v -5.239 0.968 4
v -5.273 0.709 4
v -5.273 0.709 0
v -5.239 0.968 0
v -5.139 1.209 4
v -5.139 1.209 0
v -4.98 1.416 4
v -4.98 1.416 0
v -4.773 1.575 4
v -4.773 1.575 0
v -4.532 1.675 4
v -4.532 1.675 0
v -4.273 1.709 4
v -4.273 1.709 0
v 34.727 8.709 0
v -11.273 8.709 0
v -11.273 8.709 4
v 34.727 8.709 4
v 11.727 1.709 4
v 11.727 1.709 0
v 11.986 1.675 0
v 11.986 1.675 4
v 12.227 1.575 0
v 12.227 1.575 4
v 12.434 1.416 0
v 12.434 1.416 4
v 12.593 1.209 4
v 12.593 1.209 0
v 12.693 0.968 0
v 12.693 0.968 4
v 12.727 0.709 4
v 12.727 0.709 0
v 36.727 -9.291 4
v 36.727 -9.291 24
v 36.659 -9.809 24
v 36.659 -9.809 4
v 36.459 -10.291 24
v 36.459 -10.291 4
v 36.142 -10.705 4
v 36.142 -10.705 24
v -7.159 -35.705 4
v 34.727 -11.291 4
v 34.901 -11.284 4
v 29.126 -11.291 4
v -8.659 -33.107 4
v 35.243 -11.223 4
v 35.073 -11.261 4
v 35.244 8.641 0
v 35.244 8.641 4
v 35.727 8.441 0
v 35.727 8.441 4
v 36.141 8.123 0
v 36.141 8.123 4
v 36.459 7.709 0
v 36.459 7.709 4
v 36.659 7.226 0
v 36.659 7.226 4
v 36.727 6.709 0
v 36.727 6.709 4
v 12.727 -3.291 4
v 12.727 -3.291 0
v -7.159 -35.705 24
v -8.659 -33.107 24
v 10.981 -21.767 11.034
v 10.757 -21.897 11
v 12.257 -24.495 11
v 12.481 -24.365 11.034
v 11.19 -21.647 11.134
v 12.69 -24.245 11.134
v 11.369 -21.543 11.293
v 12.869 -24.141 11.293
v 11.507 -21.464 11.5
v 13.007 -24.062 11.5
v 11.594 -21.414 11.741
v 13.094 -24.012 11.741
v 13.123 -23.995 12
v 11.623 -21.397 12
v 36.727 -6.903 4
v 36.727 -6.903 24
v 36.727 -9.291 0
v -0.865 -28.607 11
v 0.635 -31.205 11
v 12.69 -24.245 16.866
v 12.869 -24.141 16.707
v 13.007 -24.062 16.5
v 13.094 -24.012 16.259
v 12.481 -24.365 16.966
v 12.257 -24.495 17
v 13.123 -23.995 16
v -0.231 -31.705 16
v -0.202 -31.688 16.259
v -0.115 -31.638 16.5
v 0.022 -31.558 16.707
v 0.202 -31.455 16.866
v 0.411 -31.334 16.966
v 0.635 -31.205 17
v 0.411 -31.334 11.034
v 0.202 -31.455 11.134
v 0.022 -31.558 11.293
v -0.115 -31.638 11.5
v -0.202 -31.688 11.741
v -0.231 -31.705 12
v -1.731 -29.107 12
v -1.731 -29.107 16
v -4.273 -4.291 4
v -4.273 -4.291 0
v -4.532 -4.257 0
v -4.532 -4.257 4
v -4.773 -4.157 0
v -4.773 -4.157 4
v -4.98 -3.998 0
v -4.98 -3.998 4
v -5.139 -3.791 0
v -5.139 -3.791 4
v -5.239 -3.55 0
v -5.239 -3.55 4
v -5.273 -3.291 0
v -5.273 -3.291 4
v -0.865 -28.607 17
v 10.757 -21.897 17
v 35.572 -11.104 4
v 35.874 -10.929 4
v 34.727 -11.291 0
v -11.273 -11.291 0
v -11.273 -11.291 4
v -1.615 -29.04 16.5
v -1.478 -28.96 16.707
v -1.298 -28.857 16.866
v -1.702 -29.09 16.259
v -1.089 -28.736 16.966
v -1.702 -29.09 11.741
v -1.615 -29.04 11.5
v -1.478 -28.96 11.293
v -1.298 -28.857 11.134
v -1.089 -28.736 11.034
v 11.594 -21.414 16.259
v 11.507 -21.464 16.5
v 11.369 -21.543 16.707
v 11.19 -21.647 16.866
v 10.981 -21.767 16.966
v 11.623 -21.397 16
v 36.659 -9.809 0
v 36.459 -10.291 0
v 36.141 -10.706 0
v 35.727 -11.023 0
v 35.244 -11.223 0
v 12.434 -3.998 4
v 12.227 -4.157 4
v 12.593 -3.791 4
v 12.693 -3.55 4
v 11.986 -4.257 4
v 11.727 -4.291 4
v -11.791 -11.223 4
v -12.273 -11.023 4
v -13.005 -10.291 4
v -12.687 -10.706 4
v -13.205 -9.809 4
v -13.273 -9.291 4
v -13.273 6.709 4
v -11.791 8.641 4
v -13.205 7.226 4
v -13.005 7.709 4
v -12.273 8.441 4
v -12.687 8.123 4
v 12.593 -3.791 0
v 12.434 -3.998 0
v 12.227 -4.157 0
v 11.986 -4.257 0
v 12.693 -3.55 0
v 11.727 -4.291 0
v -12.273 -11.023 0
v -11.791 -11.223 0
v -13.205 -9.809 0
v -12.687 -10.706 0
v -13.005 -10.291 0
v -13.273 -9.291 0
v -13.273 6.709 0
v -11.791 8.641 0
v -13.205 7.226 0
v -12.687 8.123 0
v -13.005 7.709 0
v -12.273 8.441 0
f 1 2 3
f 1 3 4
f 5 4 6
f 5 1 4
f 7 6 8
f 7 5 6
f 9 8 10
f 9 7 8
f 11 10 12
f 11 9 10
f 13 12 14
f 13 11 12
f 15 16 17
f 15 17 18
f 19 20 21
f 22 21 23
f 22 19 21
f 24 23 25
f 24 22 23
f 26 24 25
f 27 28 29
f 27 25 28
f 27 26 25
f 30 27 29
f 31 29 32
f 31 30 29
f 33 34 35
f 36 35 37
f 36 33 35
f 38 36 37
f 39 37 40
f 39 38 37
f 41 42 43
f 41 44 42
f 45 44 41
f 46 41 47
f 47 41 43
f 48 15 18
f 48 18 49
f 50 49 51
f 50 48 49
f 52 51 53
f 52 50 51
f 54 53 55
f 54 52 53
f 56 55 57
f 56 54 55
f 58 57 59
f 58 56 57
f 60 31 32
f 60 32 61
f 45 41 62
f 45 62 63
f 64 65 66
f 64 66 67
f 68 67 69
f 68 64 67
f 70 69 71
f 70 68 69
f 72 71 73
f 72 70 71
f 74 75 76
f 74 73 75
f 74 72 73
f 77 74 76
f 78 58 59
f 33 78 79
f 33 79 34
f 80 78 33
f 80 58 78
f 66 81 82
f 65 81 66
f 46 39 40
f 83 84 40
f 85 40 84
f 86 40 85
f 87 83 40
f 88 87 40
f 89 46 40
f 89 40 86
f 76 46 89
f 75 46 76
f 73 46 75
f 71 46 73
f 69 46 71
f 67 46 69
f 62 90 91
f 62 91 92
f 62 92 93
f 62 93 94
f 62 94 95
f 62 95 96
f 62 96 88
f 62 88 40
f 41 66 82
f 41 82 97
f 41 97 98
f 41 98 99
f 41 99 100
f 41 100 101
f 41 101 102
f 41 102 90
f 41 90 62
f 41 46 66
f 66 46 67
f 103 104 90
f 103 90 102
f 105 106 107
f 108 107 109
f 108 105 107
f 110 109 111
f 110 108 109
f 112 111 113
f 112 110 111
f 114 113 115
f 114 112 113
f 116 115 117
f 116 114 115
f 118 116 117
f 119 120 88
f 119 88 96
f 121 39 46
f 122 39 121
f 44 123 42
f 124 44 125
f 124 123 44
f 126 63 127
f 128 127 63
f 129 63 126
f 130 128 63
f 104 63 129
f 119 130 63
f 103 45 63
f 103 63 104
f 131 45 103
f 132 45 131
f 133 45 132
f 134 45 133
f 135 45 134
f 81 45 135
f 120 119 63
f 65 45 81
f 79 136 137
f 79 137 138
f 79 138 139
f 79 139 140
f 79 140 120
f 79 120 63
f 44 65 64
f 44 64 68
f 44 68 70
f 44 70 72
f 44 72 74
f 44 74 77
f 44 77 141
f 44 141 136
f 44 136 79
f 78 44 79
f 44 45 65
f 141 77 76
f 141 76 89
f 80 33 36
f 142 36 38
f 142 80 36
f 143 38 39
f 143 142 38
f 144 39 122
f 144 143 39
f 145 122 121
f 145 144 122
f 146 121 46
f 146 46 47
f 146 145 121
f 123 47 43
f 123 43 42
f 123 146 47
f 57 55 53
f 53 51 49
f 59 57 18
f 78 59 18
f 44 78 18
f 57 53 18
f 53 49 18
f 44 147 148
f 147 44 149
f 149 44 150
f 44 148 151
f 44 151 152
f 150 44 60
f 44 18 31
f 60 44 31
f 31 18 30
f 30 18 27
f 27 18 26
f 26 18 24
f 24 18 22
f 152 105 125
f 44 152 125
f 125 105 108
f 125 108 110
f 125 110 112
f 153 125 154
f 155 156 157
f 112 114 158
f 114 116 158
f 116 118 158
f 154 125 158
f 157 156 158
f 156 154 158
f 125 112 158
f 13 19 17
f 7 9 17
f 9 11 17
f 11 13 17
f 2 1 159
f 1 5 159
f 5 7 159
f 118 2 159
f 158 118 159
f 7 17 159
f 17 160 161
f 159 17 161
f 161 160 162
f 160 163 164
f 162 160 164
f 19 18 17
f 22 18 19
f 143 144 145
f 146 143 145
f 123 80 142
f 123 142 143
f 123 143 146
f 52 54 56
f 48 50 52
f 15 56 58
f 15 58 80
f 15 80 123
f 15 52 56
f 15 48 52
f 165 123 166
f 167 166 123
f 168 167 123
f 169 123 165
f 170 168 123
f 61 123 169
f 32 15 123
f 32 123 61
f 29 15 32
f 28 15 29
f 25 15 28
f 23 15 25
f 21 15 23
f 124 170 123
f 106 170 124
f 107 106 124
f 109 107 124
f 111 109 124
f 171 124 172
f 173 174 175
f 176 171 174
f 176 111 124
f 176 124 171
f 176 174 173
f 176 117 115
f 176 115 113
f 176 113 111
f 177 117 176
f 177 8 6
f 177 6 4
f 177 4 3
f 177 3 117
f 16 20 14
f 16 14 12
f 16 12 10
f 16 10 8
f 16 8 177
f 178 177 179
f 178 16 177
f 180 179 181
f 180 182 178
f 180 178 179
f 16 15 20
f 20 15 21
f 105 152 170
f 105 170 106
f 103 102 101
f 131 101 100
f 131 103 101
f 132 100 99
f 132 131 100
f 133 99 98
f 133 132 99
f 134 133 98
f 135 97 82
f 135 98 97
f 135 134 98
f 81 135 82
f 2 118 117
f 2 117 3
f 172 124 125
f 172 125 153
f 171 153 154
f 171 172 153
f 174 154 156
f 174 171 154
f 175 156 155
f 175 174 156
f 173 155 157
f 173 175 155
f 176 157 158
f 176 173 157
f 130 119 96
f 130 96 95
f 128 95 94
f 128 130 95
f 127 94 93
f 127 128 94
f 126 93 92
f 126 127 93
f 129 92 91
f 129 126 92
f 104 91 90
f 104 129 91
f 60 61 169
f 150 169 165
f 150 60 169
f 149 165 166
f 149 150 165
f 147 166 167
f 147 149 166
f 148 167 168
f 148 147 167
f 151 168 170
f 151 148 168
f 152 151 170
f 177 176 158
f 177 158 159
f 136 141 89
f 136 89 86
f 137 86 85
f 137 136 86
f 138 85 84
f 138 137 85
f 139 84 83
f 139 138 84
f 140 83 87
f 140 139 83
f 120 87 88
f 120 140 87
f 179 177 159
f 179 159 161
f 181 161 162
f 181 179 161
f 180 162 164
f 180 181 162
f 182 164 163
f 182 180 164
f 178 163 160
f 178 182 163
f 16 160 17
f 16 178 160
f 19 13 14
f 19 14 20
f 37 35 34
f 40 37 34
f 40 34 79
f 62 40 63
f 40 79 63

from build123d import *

# Parameters (mm, degrees)
BOSS_EXTRU_1_DEPTH      = 4
ENL_V_MAT_EXTRU_1_DEPTH = 50
BOSS_EXTRU_2_DEPTH      = 20
ENL_V_MAT_EXTRU_2_REACH = 47.943


with BuildPart() as part:
    # Esquisse1 → Boss.-Extru.1 (new body)
    with BuildSketch(Plane.XY):
        with BuildLine():
            Line((-11.273273273, 8.708708709), (34.726726727, 8.708708709))
            ThreePointArc((34.726726727, 8.708708709), (36.140940289, 8.122922271), (36.726726727, 6.708708709))
            Line((36.726726727, 6.708708709), (36.726726727, -9.291291291))
            ThreePointArc((36.726726727, -9.291291291), (36.140940289, -10.705504854), (34.726726727, -11.291291291))
            Line((34.726726727, -11.291291291), (-11.273273273, -11.291291291))
            ThreePointArc((-11.273273273, -11.291291291), (-12.687486836, -10.705504854), (-13.273273273, -9.291291291))
            Line((-13.273273273, -9.291291291), (-13.273273273, 6.708708709))
            ThreePointArc((-13.273273273, 6.708708709), (-12.687486836, 8.122922271), (-11.273273273, 8.708708709))
        make_face()
    extrude(amount=BOSS_EXTRU_1_DEPTH)

    # Esquisse3 → Enlèv. mat.-Extru.1 (cut)
    with BuildSketch(Plane.XY.offset(4)):
        with BuildLine():
            Line((-4.273273273, 1.708708709), (11.726726727, 1.708708709))
            ThreePointArc((11.726726727, 1.708708709), (12.433833508, 1.41581549), (12.726726727, 0.708708709))
            Line((12.726726727, 0.708708709), (12.726726727, -3.291291291))
            ThreePointArc((12.726726727, -3.291291291), (12.433833508, -3.998398072), (11.726726727, -4.291291291))
            Line((11.726726727, -4.291291291), (-4.273273273, -4.291291291))
            ThreePointArc((-4.273273273, -4.291291291), (-4.980380054, -3.998398072), (-5.273273273, -3.291291291))
            Line((-5.273273273, -3.291291291), (-5.273273273, 0.708708709))
            ThreePointArc((-5.273273273, 0.708708709), (-4.980380054, 1.41581549), (-4.273273273, 1.708708709))
        make_face()
    extrude(amount=-ENL_V_MAT_EXTRU_1_DEPTH, mode=Mode.SUBTRACT)

    # Esquisse4 → Boss.-Extru.2 (add)
    with BuildSketch(Plane.XY.offset(4)):
        with BuildLine():
            Line((36.141746361, -10.704698322), (-7.159396677, -35.704918553))
            Line((-7.159396677, -35.704918553), (-8.659409891, -33.10684997))
            Line((-8.659409891, -33.10684997), (36.726726727, -6.902843996))
            Line((36.726726727, -6.902843996), (36.726726727, -9.291291291))
            ThreePointArc((36.726726727, -9.291291291), (36.5747039, -10.056131383), (36.141746361, -10.704698322))
        make_face()
    extrude(amount=BOSS_EXTRU_2_DEPTH)

    # Esquisse5 → Enlèv. mat.-Extru.2 (cut, up to next)
    with BuildSketch(Plane(origin=(12.170880133, -21.08033516, 0), x_dir=(0.8660228607631385, 0.500004404616229, 0), z_dir=(-0.500004404616229, 0.8660228607631385, 0)), mode=Mode.PRIVATE) as enl_v_mat_extru_2_sk1:
        with BuildLine():
            Line((-15.052817734, -11), (-1.632555066, -11))
            ThreePointArc((-1.632555066, -11), (-0.925448284, -11.292893219), (-0.632555066, -12))
            Line((-0.632555066, -12), (-0.632555066, -16))
            ThreePointArc((-0.632555066, -16), (-0.925448284, -16.707106781), (-1.632555066, -17))
            Line((-1.632555066, -17), (-15.052817734, -17))
            ThreePointArc((-15.052817734, -17), (-15.759924515, -16.707106781), (-16.052817734, -16))
            Line((-16.052817734, -16), (-16.052817734, -12))
            ThreePointArc((-16.052817734, -12), (-15.759924515, -11.292893219), (-15.052817734, -11))
        make_face()
    enl_v_mat_extru_2_tool1 = extrude(enl_v_mat_extru_2_sk1.sketch, amount=-ENL_V_MAT_EXTRU_2_REACH, mode=Mode.PRIVATE) & part.part
    add(enl_v_mat_extru_2_tool1.solids().sort_by_distance((4.945923, -25.251715, 14))[0], mode=Mode.SUBTRACT)


solid = part.part
